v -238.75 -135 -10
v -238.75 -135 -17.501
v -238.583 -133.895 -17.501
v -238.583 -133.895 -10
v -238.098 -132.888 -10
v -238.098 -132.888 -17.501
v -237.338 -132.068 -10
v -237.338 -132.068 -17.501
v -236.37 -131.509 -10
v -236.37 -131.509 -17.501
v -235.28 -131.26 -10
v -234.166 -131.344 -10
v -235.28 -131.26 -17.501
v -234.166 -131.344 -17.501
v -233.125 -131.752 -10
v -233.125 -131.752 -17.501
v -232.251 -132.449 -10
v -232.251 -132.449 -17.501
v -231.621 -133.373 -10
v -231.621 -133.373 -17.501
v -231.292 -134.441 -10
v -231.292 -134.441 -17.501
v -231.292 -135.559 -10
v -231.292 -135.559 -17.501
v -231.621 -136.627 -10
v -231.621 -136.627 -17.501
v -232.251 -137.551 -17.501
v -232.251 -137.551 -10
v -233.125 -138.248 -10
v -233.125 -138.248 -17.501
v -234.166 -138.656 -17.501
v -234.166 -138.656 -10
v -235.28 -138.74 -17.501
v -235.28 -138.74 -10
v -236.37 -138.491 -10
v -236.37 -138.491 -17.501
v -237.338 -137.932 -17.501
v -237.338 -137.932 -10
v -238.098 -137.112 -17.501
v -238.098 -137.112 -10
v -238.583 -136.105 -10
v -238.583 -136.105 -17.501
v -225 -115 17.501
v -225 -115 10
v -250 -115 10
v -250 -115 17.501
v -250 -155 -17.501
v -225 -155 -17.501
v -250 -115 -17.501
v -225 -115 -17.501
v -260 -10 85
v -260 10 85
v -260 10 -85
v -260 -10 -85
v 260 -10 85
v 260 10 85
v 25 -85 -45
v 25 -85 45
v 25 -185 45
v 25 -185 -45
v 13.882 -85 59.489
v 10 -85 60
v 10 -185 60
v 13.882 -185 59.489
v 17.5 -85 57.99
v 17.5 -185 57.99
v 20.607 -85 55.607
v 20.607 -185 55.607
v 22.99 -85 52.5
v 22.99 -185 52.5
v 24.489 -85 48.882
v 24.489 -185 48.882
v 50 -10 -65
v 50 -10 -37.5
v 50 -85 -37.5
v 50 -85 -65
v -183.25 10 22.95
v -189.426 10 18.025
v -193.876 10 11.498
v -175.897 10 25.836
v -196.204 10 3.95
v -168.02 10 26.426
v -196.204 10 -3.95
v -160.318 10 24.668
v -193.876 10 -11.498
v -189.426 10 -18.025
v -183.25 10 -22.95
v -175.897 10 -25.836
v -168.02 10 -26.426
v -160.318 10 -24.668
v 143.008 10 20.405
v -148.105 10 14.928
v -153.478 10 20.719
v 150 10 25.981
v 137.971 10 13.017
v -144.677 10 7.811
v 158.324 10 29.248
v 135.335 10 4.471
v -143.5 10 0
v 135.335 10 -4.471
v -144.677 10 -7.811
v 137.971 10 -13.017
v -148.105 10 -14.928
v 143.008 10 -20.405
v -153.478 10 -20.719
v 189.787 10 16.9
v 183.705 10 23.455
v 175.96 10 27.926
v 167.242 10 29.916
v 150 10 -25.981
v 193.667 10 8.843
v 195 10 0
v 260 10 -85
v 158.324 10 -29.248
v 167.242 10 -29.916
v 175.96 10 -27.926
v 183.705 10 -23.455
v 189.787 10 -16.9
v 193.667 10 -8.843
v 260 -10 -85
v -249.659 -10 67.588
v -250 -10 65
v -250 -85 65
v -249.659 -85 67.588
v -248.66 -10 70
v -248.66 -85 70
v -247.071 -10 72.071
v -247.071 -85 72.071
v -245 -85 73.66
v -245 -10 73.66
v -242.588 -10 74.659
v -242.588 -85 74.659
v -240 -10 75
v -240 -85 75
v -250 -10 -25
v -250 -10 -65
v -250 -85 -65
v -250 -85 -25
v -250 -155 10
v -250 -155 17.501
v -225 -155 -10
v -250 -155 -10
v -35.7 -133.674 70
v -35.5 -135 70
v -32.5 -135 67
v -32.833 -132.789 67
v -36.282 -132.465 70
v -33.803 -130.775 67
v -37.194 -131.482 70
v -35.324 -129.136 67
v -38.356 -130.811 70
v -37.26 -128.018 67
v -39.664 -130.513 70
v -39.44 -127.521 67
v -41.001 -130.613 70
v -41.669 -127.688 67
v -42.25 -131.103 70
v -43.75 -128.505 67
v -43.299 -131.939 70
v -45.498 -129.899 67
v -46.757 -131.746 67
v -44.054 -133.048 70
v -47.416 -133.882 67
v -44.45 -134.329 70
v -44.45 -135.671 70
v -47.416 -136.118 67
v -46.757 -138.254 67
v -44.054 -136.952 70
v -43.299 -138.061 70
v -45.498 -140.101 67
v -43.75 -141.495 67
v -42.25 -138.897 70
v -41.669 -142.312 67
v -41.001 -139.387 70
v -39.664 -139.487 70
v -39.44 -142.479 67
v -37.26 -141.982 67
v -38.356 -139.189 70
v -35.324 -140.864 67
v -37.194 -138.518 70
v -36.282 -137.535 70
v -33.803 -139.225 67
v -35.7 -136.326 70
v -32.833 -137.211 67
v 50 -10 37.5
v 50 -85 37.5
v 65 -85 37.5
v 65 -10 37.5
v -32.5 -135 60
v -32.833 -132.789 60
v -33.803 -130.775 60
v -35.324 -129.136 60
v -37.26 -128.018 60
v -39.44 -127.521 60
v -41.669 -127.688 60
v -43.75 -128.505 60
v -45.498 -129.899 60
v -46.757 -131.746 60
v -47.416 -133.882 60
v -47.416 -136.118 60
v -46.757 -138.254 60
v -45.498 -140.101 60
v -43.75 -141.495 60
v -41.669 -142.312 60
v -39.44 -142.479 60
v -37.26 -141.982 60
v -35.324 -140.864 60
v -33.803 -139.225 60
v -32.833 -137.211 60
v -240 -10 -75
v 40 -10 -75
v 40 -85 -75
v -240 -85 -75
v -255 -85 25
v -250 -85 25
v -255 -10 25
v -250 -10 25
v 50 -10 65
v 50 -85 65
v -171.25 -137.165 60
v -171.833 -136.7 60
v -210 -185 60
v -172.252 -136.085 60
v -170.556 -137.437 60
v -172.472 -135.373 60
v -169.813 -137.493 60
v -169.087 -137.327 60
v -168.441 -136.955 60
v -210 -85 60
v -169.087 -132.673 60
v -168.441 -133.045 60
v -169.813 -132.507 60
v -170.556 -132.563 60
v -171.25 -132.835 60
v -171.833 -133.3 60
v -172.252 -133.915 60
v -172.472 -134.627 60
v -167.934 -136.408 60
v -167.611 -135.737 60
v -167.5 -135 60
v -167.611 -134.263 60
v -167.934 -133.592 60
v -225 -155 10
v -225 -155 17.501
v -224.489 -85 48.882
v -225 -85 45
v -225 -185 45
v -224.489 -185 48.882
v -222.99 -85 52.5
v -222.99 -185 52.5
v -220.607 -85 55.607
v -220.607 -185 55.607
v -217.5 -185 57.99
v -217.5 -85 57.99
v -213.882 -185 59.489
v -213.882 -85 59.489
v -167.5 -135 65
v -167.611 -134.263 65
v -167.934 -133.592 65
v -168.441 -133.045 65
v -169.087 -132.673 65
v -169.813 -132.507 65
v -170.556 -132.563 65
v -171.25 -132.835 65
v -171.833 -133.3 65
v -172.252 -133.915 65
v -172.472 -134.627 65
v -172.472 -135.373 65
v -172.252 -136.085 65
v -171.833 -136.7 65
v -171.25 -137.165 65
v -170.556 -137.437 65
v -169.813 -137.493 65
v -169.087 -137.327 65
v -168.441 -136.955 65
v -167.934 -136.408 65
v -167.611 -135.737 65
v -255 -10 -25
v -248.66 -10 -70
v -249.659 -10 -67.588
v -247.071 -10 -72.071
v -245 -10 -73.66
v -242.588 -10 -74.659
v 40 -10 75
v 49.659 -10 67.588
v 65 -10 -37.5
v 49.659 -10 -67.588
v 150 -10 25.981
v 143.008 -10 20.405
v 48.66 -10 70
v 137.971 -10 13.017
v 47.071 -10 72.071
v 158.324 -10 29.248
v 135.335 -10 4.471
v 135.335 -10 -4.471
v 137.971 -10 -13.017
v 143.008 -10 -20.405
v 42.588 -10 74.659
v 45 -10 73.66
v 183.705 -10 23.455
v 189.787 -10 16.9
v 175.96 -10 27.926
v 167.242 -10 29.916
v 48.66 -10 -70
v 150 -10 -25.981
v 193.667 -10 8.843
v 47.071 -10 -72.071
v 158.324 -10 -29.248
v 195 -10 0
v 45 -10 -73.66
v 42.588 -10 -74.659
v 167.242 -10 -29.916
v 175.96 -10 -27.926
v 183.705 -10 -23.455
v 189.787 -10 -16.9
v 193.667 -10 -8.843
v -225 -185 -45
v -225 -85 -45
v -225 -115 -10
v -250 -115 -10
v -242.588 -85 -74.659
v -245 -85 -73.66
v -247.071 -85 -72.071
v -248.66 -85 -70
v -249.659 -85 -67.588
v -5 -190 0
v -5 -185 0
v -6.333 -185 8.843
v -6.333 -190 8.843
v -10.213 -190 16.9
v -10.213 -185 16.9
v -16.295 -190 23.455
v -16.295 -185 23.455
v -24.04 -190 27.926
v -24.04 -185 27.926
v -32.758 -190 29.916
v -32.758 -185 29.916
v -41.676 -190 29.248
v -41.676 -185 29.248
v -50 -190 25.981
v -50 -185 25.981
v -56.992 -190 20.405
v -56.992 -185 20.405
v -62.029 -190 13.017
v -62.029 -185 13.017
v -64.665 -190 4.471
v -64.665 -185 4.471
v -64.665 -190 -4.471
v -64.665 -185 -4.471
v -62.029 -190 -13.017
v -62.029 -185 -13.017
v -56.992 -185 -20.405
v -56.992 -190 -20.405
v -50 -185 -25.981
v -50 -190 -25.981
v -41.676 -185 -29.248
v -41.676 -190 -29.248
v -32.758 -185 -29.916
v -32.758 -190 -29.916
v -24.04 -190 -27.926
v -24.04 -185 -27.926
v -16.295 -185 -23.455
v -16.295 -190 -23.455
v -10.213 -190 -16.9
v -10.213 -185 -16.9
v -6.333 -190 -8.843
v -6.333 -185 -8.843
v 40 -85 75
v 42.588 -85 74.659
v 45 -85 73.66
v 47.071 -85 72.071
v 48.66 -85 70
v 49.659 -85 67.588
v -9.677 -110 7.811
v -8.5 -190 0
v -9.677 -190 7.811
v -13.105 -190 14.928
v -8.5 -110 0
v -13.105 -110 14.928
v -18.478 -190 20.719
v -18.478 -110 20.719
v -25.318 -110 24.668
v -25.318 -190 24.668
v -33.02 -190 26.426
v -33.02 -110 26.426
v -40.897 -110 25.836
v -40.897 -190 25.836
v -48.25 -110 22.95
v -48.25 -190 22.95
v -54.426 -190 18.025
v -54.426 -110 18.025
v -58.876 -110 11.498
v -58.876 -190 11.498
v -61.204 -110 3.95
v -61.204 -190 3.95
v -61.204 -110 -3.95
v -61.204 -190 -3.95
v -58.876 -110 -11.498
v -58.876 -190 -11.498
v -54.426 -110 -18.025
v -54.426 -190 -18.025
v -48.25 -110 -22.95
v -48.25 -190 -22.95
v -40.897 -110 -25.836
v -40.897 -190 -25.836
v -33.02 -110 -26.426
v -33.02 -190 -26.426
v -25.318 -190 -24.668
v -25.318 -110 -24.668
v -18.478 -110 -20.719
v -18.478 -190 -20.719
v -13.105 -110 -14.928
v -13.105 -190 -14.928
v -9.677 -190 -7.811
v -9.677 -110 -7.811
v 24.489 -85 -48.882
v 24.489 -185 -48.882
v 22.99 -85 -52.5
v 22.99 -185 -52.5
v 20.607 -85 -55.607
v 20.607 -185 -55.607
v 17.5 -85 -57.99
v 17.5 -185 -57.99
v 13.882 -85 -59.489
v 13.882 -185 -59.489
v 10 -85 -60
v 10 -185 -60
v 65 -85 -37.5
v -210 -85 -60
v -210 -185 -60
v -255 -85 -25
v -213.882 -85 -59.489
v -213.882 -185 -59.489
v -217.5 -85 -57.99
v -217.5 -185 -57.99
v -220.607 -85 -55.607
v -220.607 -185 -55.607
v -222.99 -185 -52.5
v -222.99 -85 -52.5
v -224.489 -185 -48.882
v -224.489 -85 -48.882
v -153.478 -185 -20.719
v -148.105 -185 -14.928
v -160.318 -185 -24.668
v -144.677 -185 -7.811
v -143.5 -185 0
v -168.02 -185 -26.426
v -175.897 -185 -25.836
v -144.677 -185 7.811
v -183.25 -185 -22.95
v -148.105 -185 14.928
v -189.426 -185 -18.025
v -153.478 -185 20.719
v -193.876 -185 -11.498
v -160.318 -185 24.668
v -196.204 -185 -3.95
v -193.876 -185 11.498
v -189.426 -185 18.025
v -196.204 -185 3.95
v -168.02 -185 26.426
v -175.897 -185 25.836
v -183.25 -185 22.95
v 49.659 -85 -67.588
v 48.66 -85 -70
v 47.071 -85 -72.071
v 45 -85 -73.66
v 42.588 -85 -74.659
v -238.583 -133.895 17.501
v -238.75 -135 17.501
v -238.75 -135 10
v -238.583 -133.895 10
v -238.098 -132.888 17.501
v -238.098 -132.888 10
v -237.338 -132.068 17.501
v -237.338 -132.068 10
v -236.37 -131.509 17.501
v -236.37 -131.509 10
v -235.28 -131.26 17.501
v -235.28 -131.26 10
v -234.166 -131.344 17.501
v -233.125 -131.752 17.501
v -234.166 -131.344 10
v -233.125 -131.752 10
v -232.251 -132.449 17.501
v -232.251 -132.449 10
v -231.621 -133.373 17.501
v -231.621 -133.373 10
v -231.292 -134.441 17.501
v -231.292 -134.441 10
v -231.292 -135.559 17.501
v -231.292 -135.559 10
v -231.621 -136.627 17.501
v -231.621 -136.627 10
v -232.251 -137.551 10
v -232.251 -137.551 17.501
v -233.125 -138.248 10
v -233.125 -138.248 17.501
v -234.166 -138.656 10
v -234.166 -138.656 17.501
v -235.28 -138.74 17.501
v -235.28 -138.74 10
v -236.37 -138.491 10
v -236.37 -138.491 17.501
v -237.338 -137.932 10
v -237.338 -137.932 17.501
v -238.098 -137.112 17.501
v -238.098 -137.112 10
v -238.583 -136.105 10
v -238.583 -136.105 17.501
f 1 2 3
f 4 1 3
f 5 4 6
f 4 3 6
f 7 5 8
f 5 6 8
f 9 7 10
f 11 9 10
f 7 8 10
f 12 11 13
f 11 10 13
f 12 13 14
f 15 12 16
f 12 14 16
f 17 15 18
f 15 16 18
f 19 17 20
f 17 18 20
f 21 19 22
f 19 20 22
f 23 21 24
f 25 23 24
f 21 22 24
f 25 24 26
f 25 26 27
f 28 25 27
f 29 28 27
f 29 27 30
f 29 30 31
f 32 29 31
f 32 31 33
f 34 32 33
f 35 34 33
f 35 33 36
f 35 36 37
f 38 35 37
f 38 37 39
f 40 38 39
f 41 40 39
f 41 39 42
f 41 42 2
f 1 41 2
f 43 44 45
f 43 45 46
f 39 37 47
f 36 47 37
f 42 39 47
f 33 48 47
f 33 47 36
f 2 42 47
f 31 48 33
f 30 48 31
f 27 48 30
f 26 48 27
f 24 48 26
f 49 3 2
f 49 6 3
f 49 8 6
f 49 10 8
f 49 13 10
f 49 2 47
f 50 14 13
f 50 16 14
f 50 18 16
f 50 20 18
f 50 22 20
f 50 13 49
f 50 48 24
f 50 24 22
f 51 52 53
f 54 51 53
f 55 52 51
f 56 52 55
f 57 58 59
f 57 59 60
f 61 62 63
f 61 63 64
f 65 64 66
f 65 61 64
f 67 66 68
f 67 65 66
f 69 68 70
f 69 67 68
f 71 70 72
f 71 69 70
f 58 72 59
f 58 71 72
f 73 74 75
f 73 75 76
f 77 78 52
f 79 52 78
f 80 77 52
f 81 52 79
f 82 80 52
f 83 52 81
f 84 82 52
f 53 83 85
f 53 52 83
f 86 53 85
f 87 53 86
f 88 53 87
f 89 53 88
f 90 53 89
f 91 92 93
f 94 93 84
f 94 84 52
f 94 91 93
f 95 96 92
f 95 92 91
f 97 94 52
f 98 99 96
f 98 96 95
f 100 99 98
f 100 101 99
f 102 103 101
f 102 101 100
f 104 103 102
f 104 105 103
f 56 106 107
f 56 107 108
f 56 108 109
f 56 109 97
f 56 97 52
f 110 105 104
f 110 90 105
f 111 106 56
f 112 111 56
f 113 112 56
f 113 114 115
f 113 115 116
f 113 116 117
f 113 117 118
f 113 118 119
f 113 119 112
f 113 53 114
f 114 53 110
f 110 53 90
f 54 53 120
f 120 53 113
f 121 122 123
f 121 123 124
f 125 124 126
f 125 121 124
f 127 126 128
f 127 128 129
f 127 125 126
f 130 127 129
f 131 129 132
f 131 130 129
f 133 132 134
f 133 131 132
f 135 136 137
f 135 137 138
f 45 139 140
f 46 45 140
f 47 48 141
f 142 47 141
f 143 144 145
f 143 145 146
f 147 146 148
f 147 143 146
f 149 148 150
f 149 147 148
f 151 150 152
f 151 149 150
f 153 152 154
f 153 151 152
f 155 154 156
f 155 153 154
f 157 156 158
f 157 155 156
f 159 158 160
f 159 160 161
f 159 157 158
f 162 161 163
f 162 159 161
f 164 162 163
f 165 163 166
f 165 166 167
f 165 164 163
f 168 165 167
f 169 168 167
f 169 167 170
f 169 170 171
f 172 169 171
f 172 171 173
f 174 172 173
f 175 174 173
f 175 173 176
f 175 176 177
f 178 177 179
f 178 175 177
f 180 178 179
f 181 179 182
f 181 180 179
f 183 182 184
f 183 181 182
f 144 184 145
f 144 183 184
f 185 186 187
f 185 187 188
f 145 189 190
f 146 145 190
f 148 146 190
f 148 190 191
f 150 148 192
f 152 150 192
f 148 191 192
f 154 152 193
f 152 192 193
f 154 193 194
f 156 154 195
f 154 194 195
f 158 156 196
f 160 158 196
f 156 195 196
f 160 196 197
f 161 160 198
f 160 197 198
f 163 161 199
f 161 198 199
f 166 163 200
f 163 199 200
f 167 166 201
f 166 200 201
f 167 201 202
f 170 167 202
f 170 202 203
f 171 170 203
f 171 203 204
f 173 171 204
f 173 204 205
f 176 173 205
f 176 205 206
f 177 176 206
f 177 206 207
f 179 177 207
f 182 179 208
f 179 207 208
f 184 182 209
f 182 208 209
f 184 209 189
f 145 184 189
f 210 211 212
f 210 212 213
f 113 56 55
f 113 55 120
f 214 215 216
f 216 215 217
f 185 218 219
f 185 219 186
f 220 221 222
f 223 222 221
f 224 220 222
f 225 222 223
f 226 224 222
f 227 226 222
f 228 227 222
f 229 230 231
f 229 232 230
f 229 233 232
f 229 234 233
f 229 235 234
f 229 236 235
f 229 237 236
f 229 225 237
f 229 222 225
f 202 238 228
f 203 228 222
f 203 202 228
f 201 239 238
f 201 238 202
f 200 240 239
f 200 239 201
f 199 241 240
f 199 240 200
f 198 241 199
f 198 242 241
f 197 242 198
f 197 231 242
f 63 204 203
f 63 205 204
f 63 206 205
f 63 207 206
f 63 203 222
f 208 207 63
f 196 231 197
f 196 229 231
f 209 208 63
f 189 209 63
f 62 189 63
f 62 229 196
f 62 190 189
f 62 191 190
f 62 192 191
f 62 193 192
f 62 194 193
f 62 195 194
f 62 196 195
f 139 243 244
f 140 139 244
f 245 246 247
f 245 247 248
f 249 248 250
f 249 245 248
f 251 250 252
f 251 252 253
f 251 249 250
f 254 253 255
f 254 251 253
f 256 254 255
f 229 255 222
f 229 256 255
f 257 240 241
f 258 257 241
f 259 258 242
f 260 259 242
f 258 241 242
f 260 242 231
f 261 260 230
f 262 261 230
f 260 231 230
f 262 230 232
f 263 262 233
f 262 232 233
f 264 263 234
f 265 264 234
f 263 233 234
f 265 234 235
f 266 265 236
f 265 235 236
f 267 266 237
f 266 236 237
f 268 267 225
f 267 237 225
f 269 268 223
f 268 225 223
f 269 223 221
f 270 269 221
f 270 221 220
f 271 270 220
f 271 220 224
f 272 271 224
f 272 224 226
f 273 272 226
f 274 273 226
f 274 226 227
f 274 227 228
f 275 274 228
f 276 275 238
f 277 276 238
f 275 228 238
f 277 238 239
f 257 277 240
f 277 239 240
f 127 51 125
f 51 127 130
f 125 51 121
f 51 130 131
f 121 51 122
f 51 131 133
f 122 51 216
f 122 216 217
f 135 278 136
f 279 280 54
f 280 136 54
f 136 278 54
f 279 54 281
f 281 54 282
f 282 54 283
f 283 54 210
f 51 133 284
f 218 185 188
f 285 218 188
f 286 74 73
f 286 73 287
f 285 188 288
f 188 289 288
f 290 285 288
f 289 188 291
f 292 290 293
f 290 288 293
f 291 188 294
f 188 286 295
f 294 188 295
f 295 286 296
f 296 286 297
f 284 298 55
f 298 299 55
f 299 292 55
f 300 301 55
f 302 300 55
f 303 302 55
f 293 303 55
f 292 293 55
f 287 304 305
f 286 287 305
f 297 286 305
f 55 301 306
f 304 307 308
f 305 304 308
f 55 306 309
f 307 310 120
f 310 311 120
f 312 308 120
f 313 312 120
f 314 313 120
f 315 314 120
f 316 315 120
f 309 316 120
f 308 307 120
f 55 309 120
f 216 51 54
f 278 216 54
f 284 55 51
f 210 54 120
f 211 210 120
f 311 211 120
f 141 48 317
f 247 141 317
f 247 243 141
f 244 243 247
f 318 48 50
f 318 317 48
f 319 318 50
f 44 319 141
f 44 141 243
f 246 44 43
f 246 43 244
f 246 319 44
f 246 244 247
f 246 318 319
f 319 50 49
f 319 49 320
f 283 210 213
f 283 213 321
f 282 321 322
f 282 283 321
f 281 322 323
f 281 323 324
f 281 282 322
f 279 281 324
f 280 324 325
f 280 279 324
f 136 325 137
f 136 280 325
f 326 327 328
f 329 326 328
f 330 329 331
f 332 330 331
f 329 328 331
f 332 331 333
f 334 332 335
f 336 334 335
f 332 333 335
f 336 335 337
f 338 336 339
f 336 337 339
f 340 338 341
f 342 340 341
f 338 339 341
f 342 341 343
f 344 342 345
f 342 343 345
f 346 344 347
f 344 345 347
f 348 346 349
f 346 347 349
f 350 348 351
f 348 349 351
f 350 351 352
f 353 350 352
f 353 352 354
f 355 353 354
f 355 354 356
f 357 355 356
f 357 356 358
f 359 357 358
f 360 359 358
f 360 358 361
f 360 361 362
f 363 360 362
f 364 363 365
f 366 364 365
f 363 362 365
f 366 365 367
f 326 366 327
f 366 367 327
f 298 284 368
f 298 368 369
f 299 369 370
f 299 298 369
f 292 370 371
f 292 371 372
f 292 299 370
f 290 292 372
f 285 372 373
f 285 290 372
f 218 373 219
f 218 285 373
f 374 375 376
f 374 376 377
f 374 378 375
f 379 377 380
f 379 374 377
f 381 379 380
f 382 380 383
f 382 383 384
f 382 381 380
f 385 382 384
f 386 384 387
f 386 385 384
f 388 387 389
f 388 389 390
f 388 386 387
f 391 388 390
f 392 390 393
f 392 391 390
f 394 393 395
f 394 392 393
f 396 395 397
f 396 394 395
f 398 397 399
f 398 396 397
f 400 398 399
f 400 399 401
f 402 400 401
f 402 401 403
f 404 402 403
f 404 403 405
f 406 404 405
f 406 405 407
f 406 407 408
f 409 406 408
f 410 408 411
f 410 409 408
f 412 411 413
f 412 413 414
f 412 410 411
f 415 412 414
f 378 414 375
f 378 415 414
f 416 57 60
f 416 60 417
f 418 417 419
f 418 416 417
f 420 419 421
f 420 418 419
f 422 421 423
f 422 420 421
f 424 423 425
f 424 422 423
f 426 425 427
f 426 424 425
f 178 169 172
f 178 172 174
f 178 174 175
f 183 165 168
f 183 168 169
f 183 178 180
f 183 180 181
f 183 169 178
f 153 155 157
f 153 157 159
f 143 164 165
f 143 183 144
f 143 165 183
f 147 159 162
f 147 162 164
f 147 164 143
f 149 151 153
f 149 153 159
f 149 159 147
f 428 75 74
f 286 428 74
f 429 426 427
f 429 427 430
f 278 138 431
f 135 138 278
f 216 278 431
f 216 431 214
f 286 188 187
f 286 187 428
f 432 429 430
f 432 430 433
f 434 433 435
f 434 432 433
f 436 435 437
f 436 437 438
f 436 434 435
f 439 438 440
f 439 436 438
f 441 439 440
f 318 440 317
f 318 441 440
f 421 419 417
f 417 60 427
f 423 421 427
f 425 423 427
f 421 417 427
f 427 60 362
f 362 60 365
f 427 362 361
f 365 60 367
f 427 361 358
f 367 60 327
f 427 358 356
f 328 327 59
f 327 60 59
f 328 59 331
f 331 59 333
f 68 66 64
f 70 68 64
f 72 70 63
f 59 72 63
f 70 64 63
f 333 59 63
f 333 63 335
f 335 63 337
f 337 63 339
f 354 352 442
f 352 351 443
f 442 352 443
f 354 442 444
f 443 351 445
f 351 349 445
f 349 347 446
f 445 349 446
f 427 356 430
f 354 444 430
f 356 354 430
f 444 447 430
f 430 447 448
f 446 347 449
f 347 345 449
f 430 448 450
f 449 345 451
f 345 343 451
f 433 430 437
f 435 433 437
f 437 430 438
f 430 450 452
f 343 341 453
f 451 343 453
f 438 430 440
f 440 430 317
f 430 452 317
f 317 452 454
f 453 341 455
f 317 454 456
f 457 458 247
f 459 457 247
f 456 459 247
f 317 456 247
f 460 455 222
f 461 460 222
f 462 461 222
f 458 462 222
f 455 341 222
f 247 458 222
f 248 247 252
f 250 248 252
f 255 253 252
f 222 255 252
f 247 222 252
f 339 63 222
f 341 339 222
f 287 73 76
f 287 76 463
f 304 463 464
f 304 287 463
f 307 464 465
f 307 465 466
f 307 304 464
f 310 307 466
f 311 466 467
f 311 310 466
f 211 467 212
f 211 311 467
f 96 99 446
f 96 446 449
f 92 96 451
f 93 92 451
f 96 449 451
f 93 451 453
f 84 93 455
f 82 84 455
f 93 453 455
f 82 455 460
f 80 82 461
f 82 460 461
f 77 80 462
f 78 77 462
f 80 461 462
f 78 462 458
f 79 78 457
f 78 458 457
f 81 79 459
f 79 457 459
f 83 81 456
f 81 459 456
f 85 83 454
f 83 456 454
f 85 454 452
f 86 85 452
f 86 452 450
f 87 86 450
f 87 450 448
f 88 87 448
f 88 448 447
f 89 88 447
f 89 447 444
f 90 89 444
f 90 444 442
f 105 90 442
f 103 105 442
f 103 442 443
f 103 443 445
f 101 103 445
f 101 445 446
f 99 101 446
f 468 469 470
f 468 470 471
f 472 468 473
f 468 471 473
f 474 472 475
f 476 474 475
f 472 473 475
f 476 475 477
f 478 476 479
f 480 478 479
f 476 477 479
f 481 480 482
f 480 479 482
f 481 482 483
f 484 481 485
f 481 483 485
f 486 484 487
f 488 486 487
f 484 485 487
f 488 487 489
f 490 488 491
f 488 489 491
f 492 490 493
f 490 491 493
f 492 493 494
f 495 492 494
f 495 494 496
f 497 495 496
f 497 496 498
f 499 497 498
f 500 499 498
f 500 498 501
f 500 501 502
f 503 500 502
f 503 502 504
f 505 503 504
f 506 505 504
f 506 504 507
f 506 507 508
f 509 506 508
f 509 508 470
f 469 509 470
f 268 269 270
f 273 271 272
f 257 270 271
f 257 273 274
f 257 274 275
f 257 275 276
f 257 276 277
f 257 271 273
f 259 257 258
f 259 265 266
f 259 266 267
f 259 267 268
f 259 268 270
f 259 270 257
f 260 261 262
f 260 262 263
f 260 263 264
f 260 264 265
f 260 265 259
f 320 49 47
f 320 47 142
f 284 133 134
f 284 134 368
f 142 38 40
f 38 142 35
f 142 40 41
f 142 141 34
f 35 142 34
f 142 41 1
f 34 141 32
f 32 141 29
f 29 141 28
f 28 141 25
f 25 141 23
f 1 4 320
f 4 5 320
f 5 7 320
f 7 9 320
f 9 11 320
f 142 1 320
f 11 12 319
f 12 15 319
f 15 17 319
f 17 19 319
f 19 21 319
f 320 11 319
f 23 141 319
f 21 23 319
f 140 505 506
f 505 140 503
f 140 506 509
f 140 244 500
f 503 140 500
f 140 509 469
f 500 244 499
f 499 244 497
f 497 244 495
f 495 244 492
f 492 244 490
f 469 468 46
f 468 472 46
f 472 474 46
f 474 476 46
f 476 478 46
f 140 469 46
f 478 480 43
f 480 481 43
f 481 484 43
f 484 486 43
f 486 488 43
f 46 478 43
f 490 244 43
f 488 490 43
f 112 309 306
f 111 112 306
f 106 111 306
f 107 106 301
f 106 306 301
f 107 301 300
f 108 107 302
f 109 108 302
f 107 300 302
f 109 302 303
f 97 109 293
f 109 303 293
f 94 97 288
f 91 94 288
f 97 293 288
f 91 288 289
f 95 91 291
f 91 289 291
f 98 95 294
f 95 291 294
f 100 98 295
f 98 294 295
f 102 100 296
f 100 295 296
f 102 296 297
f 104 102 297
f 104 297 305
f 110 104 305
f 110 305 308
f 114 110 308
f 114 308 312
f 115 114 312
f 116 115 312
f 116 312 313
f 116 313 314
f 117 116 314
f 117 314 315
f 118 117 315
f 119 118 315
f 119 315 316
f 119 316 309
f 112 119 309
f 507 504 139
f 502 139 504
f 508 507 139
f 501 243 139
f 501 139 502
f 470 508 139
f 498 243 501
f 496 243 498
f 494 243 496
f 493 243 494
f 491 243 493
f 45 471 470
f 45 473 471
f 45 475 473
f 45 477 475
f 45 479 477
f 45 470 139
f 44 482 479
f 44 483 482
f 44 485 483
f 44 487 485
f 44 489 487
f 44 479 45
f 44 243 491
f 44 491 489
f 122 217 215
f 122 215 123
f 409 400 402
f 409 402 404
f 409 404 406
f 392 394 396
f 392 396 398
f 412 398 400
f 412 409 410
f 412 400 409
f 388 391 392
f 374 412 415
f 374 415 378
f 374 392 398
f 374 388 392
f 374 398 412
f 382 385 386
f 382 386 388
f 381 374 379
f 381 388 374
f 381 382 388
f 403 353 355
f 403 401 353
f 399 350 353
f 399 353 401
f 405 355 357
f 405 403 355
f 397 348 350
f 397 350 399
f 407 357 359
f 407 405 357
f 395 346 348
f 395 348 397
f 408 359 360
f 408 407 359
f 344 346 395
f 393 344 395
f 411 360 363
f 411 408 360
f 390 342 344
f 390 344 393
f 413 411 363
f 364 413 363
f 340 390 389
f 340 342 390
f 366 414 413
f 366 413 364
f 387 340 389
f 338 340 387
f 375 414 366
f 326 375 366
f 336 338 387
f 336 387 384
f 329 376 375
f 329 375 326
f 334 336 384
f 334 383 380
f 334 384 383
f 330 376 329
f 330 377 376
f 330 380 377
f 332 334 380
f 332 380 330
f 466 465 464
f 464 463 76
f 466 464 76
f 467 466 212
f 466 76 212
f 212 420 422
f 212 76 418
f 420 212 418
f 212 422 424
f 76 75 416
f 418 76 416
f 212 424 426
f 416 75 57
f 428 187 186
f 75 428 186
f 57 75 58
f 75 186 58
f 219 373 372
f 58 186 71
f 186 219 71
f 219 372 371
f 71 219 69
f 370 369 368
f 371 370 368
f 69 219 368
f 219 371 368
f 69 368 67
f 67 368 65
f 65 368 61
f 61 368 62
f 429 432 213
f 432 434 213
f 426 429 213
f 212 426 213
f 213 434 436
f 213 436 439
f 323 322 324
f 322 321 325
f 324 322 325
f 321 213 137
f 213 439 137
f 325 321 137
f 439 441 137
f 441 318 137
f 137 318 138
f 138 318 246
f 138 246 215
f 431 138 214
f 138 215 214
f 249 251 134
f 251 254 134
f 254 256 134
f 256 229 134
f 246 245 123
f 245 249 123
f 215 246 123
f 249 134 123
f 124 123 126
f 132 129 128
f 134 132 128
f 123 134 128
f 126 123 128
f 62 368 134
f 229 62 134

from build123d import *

# Parameters (mm, degrees)
SKETCH1_W           = 520
SKETCH1_H           = 170
BOSS_EXTRUDE1_DEPTH = 10
BOSS_EXTRUDE2_DEPTH = 75
BOSS_EXTRUDE3_DEPTH = 100
SKETCH4_W           = 7.501461654
SKETCH4_H           = 40
BOSS_EXTRUDE4_DEPTH = 25
SKETCH5_R           = 3.75
CUT_EXTRUDE1_DEPTH  = 93
SKETCH6_W           = 50
SKETCH6_H           = 75
BOSS_EXTRUDE5_DEPTH = 5
SKETCH7_R           = 30
CUT_EXTRUDE2_DEPTH  = 68
SKETCH8_W           = 75
SKETCH8_H           = 75
BOSS_EXTRUDE6_DEPTH = 15
SKETCH9_R           = 30
SKETCH9_R_2         = 26.5
BOSS_EXTRUDE7_DEPTH = 5
SKETCH11_R          = 26.5
CUT_EXTRUDE3_DEPTH  = 75
SKETCH12_R          = 26.5
CUT_EXTRUDE4_DEPTH  = 196
SKETCH14_R          = 7.5
BOSS_EXTRUDE8_DEPTH = 10
CHAMFER1_SIZE       = 3
SKETCH15_R          = 2.5
BOSS_EXTRUDE9_DEPTH = 5


with BuildPart() as part:
    # Sketch1 → Boss-Extrude1 (new body, symmetric)
    with BuildSketch(Plane(origin=(0, 0, 0), x_dir=(1, 0, 0), z_dir=(0, 1, 0))):
        Rectangle(SKETCH1_W, SKETCH1_H)
    extrude(amount=BOSS_EXTRUDE1_DEPTH, both=True)

    # Sketch2 → Boss-Extrude2 (add)
    with BuildSketch(Plane.XZ.offset(10)):
        with BuildLine():
            Line((-240, 75), (40, 75))
            ThreePointArc((40, 75), (47.071067812, 72.071067812), (50, 65))
            Line((50, 65), (50, -65))
            ThreePointArc((50, -65), (47.071067812, -72.071067812), (40, -75))
            Line((40, -75), (-240, -75))
            ThreePointArc((-240, -75), (-247.071067812, -72.071067812), (-250, -65))
            Line((-250, -65), (-250, 65))
            ThreePointArc((-250, 65), (-247.071067812, 72.071067812), (-240, 75))
        make_face()
    extrude(amount=BOSS_EXTRUDE2_DEPTH)

    # Sketch3 → Boss-Extrude3 (add)
    with BuildSketch(Plane.XZ.offset(85)):
        with BuildLine():
            Line((-210, 60), (10, 60))
            ThreePointArc((10, 60), (20.606601718, 55.606601718), (25, 45))
            Line((25, 45), (25, -45))
            ThreePointArc((25, -45), (20.606601718, -55.606601718), (10, -60))
            Line((10, -60), (-210, -60))
            ThreePointArc((-210, -60), (-220.606601718, -55.606601718), (-225, -45))
            Line((-225, -45), (-225, 45))
            ThreePointArc((-225, 45), (-220.606601718, 55.606601718), (-210, 60))
        make_face()
    extrude(amount=BOSS_EXTRUDE3_DEPTH)

    # Sketch4 → Boss-Extrude4 (add)
    with BuildSketch(Plane.ZY.offset(225)):
        with Locations((13.750730827, -135)):
            Rectangle(SKETCH4_W, SKETCH4_H)
        with Locations((-13.750730827, -135)):
            Rectangle(SKETCH4_W, SKETCH4_H)
    extrude(amount=BOSS_EXTRUDE4_DEPTH)

    # Sketch5 → Cut-Extrude1 (cut)
    with BuildSketch(Plane(origin=(0, 0, -17.501461654), x_dir=(-1, 0, 0), z_dir=(0, 0, -1))):
        with Locations((235, -135)):
            Circle(SKETCH5_R)
    extrude(amount=-CUT_EXTRUDE1_DEPTH, mode=Mode.SUBTRACT)

    # Sketch6 → Boss-Extrude5 (add)
    with BuildSketch(Plane.ZY.offset(250)):
        with Locations((0, -47.5)):
            Rectangle(SKETCH6_W, SKETCH6_H)
    extrude(amount=BOSS_EXTRUDE5_DEPTH)

    # Sketch7 → Cut-Extrude2 (cut)
    with BuildSketch(Plane.XZ.offset(10)):
        with Locations((165, 0)):
            Circle(SKETCH7_R)
    extrude(amount=-CUT_EXTRUDE2_DEPTH, mode=Mode.SUBTRACT)

    # Sketch8 → Boss-Extrude6 (add)
    with BuildSketch(Plane(origin=(50, 0, 0), x_dir=(0, 0, -1), z_dir=(1, 0, 0))):
        with Locations((0, -47.5)):
            Rectangle(SKETCH8_W, SKETCH8_H)
    extrude(amount=BOSS_EXTRUDE6_DEPTH)

    # Sketch9 → Boss-Extrude7 (add)
    with BuildSketch(Plane.XZ.offset(185)):
        with Locations((-35, 0)):
            Circle(SKETCH9_R)
        with Locations((-35, 0)):
            Circle(SKETCH9_R_2, mode=Mode.SUBTRACT)
    extrude(amount=BOSS_EXTRUDE7_DEPTH)

    # Sketch11 → Cut-Extrude3 (cut)
    with BuildSketch(Plane.XZ.offset(185)):
        with Locations((-35, 0)):
            Circle(SKETCH11_R)
    extrude(amount=-CUT_EXTRUDE3_DEPTH, mode=Mode.SUBTRACT)

    # Sketch12 → Cut-Extrude4 (cut, through all)
    with BuildSketch(Plane.XZ.offset(185)):
        with Locations((-170, 0)):
            Circle(SKETCH12_R)
    extrude(amount=-CUT_EXTRUDE4_DEPTH, mode=Mode.SUBTRACT)

    # Sketch14 → Boss-Extrude8 (add)
    with BuildSketch(Plane.XY.offset(60)):
        with Locations((-40, -135)):
            Circle(SKETCH14_R)
    extrude(amount=BOSS_EXTRUDE8_DEPTH)

    # Chamfer1
    chamfer1_edges = [part.edges().sort_by_distance(p)[0] for p in [
        (-47.5, -135, 70),
    ]]
    chamfer(chamfer1_edges, length=CHAMFER1_SIZE)

    # Sketch15 → Boss-Extrude9 (add)
    with BuildSketch(Plane.XY.offset(60)):
        with Locations((-170, -135)):
            Circle(SKETCH15_R)
    extrude(amount=BOSS_EXTRUDE9_DEPTH)


solid = part.part
